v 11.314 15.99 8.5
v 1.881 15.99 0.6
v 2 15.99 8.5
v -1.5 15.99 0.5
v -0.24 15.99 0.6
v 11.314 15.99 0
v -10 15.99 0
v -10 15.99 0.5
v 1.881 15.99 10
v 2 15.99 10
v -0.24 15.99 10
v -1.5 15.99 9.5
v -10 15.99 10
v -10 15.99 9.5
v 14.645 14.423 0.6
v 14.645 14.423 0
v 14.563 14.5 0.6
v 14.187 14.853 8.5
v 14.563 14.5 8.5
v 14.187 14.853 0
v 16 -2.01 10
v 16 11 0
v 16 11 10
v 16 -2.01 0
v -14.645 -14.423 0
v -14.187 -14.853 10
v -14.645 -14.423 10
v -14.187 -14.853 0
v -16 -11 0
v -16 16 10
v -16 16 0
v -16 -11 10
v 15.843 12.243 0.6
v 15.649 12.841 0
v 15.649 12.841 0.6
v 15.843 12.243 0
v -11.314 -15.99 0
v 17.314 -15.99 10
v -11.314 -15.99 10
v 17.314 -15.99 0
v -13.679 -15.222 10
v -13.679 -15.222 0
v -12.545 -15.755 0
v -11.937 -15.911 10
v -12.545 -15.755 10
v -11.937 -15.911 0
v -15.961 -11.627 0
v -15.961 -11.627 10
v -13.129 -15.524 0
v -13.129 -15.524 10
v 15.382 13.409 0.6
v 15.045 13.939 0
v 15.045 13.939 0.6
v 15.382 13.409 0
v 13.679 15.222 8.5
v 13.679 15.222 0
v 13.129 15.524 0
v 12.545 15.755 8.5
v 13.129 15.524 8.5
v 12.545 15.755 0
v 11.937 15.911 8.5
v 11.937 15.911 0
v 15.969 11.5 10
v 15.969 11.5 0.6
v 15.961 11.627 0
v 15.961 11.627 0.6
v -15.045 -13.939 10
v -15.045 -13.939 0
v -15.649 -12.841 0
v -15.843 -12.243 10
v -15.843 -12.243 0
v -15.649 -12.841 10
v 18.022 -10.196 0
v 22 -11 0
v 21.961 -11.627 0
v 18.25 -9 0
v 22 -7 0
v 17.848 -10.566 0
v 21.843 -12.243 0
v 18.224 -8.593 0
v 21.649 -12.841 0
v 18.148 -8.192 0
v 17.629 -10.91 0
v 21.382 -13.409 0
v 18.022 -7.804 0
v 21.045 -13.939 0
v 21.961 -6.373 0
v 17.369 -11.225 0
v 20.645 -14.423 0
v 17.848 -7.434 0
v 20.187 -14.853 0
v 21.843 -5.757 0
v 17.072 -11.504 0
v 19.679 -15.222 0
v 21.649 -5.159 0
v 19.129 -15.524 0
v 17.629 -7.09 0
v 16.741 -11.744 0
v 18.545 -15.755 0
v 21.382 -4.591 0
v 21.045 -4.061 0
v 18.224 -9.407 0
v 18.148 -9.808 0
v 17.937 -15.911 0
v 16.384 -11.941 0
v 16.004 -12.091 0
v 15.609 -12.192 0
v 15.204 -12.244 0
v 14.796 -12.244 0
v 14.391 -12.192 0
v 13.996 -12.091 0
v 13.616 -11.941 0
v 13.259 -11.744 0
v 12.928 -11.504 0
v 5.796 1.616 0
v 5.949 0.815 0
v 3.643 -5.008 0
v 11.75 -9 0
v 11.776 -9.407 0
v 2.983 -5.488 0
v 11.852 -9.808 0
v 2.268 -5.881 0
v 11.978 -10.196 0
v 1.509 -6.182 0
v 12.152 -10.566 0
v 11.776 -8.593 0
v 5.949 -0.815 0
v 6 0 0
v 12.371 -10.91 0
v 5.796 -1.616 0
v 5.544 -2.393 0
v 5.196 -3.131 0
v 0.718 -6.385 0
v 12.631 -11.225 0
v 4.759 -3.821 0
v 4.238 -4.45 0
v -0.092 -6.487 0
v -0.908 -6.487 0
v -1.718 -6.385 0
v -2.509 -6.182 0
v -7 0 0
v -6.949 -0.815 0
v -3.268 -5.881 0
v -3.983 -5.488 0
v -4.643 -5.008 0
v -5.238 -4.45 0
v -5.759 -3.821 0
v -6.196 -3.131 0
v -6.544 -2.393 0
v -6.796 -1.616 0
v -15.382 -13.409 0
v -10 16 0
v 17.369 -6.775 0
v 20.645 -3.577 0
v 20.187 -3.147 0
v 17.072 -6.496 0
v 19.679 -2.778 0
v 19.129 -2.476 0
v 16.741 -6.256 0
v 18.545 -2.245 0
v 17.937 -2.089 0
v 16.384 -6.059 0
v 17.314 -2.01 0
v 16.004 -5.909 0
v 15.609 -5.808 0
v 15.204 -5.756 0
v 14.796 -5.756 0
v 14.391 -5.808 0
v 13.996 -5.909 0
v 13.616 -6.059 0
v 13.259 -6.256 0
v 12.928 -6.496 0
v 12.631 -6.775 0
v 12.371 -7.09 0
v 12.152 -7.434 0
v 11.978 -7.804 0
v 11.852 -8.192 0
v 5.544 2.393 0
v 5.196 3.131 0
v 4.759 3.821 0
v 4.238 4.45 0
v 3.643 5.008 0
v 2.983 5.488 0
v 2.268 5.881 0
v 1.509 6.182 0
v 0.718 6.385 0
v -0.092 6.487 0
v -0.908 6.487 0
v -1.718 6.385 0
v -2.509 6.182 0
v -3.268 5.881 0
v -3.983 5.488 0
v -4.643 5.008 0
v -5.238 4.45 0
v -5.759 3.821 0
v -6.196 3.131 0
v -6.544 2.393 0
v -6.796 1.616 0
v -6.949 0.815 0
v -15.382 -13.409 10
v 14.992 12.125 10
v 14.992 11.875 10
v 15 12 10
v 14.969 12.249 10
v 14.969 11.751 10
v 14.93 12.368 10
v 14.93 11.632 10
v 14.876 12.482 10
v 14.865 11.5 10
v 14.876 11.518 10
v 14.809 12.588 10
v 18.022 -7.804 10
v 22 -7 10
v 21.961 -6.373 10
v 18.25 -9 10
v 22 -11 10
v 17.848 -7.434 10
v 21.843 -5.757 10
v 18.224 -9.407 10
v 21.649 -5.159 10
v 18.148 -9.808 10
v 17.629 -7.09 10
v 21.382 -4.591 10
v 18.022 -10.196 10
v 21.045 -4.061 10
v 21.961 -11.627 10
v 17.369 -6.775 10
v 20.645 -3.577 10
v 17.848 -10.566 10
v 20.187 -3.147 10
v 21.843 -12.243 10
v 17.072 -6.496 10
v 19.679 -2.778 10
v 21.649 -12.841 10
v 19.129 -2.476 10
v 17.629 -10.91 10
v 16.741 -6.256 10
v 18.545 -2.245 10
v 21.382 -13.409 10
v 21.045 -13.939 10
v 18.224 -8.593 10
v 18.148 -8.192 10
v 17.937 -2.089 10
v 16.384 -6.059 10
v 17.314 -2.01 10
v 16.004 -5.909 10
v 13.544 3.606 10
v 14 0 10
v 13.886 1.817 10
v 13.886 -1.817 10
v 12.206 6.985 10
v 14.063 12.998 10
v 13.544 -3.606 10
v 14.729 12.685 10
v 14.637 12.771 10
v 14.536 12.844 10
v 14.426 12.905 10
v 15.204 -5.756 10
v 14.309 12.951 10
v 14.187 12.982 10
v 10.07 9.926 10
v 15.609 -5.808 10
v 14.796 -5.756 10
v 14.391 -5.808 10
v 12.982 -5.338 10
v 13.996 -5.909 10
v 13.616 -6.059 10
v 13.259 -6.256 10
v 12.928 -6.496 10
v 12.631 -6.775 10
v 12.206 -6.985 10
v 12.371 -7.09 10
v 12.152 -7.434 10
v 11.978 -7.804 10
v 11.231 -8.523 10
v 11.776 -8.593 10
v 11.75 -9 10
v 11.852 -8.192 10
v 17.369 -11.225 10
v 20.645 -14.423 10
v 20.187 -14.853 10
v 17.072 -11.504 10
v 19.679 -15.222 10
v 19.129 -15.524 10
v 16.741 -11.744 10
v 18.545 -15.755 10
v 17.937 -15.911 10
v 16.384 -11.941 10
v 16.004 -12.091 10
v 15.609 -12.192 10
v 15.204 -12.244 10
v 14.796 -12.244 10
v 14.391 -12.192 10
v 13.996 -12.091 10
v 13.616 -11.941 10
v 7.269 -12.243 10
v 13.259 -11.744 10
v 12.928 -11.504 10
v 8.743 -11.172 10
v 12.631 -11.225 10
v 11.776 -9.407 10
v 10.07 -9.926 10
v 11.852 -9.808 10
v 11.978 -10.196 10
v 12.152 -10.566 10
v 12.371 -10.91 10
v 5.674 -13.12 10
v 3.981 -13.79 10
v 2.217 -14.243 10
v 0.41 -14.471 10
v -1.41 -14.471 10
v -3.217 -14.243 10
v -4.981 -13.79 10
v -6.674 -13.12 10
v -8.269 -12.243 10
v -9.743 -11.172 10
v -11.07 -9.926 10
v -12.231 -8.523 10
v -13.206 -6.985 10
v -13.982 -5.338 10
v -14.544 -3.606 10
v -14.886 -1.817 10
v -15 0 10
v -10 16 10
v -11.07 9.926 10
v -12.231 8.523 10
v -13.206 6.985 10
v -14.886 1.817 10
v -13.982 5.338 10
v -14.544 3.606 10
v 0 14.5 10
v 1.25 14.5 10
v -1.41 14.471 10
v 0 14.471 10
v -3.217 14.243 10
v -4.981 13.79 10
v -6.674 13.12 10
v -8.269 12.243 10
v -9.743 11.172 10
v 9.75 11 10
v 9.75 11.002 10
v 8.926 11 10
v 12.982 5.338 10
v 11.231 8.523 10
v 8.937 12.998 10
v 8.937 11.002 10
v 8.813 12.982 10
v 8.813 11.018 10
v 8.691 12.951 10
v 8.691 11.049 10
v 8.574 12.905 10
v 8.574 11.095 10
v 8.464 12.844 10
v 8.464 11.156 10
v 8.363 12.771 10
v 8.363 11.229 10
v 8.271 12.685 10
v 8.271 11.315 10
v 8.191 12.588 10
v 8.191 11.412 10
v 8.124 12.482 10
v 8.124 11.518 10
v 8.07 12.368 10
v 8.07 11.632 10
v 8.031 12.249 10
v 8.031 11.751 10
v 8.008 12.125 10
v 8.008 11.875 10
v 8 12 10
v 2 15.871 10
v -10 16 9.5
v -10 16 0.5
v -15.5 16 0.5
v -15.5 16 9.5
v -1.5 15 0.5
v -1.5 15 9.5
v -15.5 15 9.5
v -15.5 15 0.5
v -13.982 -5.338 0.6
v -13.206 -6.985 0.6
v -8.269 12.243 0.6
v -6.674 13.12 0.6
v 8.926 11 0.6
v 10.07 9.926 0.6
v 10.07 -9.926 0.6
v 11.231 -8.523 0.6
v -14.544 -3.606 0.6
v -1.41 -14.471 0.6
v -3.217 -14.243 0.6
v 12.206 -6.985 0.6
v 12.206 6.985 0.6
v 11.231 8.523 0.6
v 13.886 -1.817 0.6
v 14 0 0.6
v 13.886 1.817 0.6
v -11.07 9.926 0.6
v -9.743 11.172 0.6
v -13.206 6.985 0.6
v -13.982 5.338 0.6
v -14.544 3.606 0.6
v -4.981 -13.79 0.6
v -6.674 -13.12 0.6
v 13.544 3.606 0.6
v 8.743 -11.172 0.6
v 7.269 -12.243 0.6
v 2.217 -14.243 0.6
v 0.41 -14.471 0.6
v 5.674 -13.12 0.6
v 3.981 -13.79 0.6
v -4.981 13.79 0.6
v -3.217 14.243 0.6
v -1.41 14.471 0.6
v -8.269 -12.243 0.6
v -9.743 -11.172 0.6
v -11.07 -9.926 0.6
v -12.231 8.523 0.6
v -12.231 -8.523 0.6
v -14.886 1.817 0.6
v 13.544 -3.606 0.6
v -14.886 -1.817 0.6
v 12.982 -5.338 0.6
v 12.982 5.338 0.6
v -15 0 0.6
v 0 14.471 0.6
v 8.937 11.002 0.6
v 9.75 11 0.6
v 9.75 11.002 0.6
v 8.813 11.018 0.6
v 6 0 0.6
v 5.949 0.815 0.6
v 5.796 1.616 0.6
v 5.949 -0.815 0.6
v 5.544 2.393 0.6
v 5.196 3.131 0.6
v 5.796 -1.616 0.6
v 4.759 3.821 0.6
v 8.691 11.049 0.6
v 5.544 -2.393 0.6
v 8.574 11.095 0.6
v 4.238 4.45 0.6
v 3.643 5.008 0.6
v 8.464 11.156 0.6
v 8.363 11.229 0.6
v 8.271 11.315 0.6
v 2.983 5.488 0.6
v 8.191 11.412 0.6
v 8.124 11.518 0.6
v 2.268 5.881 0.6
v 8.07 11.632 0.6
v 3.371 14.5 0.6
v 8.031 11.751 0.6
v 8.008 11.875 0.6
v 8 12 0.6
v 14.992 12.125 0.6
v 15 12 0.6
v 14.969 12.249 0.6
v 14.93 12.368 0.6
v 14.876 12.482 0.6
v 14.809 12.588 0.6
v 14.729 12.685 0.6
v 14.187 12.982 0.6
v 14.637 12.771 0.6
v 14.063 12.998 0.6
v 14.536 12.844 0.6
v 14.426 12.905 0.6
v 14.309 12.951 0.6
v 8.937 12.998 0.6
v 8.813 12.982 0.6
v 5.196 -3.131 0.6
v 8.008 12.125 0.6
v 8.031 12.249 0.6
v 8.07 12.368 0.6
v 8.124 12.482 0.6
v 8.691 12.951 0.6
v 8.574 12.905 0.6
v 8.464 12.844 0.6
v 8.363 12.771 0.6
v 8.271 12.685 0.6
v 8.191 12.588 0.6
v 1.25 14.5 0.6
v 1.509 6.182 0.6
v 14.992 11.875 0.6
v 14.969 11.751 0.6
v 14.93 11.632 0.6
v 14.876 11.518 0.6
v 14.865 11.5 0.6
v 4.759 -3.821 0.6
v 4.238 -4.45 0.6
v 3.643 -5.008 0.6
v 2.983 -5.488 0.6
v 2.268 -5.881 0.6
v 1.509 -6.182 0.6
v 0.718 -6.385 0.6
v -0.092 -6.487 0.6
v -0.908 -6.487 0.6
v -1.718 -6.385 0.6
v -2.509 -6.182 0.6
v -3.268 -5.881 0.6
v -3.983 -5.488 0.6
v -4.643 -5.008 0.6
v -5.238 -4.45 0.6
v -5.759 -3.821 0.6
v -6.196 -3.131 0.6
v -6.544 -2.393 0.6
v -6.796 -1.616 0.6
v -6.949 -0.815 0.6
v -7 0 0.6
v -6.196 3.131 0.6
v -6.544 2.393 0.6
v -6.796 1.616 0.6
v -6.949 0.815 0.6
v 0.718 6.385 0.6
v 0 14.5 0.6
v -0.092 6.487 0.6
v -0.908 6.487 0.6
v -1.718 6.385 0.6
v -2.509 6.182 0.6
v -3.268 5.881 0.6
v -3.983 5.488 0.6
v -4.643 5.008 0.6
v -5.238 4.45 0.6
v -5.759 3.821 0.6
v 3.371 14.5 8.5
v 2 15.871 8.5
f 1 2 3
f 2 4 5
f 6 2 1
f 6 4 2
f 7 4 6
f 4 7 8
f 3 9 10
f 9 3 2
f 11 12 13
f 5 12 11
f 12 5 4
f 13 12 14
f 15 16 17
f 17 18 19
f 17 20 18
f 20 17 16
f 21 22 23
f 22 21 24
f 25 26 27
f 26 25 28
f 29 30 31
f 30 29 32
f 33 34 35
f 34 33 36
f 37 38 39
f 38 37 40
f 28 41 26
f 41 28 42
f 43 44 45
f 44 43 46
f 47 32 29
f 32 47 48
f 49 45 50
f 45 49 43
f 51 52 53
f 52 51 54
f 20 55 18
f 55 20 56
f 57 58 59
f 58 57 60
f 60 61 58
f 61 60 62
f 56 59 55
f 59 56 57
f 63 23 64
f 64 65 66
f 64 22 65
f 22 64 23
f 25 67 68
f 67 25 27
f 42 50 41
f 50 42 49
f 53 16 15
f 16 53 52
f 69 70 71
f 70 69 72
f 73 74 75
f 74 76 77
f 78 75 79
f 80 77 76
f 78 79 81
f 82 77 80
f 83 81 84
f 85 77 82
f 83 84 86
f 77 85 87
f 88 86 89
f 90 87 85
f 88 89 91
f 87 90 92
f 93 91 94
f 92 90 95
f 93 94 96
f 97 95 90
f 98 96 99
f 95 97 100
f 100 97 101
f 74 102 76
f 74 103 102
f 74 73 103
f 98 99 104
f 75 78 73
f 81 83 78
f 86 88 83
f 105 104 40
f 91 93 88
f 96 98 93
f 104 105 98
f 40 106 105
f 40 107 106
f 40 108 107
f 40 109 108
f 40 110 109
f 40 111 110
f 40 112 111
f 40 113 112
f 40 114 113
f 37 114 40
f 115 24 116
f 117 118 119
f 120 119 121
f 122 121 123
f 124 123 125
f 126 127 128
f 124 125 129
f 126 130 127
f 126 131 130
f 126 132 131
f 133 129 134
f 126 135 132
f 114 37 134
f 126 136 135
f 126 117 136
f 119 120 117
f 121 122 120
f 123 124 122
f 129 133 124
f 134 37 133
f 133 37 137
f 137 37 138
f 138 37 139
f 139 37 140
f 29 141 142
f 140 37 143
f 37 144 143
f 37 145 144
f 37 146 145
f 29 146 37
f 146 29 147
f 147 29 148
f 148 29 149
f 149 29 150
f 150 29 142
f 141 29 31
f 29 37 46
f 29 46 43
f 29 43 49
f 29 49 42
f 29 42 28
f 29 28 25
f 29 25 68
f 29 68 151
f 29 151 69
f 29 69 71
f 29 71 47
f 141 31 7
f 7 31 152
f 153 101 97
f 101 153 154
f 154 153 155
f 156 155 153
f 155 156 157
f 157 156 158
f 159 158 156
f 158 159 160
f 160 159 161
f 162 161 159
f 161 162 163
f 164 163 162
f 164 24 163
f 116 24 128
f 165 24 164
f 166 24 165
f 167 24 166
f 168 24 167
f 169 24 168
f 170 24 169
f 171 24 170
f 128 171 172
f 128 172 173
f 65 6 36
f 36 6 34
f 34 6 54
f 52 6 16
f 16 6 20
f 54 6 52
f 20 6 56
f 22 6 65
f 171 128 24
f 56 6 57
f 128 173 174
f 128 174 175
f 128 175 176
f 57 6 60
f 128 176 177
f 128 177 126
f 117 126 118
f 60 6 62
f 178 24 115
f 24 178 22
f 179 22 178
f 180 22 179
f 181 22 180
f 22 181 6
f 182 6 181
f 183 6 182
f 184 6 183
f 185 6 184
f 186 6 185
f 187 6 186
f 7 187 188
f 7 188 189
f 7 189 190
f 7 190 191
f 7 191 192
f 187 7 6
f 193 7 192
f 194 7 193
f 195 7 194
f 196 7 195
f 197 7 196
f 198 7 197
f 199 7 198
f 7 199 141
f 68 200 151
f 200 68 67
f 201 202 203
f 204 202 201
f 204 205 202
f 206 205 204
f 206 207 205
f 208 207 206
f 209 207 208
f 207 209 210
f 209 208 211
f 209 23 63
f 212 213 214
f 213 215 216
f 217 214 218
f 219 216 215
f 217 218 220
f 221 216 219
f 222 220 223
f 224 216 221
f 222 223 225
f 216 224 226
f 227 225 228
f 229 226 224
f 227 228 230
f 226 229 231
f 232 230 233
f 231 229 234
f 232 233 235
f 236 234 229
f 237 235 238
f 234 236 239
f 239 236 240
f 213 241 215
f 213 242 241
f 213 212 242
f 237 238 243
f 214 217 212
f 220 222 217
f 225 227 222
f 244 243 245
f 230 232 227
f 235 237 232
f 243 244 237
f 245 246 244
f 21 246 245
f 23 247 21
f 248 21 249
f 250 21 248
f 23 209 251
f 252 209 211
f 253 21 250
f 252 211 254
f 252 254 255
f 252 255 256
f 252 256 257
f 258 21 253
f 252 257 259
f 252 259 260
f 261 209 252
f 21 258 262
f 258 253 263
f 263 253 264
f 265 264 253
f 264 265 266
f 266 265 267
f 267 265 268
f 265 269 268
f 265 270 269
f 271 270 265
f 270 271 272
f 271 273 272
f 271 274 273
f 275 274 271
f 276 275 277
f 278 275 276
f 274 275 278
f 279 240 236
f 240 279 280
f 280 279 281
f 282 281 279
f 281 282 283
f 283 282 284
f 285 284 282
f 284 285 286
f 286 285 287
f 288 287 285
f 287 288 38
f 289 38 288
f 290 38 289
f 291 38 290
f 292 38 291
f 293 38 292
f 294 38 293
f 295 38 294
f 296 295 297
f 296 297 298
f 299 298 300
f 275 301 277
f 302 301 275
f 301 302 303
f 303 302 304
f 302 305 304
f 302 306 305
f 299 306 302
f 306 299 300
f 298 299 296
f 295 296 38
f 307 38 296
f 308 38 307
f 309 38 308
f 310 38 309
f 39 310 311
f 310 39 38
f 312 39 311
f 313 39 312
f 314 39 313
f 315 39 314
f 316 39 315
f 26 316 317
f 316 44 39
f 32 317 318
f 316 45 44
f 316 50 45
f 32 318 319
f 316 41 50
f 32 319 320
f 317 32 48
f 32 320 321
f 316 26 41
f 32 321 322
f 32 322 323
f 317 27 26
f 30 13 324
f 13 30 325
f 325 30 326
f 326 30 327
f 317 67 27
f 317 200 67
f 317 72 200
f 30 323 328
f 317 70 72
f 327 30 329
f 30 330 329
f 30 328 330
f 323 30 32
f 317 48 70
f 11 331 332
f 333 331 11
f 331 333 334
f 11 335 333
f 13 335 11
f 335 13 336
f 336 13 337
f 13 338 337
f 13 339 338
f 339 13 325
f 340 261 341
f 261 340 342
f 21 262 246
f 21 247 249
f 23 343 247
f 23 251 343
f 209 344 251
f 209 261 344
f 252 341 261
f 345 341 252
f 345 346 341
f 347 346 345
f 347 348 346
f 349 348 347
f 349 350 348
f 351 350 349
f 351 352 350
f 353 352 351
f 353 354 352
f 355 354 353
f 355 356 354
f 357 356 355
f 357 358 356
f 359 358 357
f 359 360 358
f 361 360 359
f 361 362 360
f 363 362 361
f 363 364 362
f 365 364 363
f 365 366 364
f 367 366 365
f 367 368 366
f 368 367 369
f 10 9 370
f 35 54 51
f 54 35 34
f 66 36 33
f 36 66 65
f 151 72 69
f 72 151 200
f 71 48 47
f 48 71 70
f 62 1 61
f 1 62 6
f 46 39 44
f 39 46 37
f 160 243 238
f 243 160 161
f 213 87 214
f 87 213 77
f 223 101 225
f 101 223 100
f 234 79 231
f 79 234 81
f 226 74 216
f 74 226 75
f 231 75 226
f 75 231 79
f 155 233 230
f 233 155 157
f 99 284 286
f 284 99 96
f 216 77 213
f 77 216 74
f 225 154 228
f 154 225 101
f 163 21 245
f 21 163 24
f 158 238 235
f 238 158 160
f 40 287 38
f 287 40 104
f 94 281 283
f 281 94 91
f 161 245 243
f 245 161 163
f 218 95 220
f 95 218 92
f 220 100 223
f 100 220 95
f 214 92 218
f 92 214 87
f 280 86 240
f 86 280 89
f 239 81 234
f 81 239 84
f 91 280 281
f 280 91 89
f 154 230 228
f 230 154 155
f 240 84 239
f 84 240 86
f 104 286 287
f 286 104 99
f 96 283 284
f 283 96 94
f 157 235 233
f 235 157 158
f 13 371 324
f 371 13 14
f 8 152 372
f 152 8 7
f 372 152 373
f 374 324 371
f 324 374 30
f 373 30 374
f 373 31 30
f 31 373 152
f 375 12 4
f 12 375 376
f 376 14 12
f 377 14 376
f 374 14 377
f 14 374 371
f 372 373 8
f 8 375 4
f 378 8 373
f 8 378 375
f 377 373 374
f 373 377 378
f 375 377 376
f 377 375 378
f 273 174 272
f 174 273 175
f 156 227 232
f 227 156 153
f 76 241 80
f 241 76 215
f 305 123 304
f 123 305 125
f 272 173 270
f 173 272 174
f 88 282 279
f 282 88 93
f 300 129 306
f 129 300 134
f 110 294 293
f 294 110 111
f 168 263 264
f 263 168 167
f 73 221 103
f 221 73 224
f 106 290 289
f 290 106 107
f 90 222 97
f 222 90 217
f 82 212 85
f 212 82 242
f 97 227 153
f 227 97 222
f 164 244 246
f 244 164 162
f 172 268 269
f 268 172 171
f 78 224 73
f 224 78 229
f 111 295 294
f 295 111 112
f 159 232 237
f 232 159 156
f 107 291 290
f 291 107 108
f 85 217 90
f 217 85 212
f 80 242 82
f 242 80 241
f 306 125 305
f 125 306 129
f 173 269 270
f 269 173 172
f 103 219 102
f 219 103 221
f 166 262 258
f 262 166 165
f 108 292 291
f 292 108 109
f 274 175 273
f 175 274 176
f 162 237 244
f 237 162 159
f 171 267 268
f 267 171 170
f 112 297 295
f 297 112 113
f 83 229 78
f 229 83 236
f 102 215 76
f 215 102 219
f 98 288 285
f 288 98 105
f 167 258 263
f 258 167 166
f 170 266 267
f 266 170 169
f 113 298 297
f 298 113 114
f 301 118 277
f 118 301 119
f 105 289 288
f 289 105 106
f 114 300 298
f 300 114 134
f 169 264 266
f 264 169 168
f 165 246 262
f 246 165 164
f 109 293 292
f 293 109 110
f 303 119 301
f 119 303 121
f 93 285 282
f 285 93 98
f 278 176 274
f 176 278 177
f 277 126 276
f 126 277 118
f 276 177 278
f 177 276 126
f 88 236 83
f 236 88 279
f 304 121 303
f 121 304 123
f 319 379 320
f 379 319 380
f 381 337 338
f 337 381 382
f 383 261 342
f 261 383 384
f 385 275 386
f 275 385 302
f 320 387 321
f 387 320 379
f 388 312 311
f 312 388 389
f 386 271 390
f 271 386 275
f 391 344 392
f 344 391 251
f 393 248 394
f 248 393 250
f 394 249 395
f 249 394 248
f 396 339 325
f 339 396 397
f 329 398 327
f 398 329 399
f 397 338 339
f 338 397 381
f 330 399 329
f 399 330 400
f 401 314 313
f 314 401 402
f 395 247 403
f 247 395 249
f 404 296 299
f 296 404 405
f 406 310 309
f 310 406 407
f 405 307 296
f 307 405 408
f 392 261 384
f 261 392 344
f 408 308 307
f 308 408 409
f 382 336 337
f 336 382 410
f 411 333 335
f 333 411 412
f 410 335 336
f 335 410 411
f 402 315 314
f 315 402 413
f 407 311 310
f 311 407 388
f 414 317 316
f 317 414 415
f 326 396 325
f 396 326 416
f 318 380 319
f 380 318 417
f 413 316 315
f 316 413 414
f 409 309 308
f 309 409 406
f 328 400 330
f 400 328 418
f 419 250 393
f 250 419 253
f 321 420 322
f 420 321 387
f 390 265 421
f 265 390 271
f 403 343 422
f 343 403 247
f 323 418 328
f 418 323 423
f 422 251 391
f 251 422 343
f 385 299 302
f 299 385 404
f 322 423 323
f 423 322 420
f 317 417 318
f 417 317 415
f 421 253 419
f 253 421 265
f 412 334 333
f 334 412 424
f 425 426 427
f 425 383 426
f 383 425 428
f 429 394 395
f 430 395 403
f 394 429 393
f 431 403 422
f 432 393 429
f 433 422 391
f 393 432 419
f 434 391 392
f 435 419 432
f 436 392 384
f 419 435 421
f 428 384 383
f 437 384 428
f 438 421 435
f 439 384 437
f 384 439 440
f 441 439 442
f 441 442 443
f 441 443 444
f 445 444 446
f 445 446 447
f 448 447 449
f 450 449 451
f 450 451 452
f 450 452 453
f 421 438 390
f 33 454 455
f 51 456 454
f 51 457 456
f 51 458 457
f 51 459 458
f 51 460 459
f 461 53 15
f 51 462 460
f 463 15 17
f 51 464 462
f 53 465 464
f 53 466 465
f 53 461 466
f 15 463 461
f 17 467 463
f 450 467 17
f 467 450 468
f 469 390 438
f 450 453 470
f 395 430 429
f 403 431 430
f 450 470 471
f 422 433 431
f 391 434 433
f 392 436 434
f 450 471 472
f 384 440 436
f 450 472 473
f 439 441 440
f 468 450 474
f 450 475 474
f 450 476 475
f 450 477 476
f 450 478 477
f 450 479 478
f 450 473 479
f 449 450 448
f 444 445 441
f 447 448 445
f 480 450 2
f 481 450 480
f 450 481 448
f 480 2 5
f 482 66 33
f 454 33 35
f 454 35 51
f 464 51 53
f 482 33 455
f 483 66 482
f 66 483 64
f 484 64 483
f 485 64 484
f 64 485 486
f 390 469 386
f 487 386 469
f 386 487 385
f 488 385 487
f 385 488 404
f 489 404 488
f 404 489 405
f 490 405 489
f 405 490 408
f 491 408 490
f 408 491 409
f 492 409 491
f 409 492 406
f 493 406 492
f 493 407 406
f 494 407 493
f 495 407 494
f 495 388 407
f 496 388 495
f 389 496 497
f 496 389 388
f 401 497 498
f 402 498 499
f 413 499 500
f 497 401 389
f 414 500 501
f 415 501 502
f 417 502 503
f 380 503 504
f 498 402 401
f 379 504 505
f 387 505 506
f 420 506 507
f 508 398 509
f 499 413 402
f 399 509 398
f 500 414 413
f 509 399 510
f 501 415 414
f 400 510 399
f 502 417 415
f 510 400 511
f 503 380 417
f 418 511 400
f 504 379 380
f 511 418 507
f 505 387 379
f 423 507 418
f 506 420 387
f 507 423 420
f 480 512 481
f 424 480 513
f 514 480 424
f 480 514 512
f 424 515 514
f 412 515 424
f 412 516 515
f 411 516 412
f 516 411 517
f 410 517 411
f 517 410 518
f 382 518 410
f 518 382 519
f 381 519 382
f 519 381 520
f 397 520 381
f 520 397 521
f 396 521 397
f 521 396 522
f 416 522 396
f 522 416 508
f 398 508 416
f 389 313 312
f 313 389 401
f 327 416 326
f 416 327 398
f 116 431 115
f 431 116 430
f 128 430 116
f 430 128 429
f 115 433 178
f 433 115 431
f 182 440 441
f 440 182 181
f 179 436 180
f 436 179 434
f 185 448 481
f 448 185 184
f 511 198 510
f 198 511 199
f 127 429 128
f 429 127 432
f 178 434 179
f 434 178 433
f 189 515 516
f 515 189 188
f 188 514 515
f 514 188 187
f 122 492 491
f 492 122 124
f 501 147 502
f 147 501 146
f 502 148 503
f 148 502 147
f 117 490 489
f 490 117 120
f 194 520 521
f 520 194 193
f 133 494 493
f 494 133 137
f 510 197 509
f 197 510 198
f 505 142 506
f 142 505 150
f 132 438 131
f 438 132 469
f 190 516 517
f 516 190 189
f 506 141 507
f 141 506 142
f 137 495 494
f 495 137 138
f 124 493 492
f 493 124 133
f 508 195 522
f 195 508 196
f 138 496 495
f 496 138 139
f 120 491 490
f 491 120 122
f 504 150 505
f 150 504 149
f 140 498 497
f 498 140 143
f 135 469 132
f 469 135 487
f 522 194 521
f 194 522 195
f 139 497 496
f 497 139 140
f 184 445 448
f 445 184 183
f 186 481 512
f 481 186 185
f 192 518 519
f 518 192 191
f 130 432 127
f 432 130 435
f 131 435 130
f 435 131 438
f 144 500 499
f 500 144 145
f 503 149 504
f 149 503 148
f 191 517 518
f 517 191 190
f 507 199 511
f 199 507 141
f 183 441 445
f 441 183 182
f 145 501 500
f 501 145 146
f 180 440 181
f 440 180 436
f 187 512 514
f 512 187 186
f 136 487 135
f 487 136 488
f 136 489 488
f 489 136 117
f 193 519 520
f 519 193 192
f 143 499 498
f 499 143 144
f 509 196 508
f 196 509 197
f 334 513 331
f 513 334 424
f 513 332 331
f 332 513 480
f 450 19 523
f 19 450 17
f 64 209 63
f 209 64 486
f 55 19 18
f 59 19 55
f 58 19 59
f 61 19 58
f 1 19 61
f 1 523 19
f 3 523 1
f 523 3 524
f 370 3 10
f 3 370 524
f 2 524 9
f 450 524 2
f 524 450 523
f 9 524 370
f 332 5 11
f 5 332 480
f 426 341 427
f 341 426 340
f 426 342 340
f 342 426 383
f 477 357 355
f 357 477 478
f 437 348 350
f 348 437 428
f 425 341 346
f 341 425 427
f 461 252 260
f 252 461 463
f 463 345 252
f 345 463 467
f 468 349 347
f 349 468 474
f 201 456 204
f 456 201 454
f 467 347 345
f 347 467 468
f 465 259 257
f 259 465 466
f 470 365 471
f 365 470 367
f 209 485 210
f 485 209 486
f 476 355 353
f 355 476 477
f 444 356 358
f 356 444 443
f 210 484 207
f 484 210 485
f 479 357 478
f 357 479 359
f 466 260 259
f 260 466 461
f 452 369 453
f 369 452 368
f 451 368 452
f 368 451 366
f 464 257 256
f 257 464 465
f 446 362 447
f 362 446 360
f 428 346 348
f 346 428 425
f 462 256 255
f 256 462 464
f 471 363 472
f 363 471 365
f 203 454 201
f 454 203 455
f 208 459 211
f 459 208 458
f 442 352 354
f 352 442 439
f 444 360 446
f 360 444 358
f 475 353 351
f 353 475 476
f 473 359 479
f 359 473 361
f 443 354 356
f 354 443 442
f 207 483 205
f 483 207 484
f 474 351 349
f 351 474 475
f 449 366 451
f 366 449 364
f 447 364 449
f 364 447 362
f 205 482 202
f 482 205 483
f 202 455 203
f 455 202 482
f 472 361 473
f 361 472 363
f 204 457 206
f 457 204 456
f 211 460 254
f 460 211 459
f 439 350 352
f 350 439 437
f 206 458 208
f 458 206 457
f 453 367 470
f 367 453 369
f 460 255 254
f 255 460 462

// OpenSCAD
$fn = 50;


union() {
	difference() {
		union() {
			translate(v = [0, 0, 0]) {
				rotate(a = [0, 0, 0]) {
					hull() {
						translate(v = [-11.0000000000, 11.0000000000, 0]) {
							rotate(a = [0, 0, 0]) {
								translate(v = [0, 0, 0]) {
									rotate(a = [0, 0, 0]) {
										cylinder(h = 10, r = 5);
									}
								}
							}
						}
						translate(v = [11.0000000000, 11.0000000000, 0]) {
							rotate(a = [0, 0, 0]) {
								translate(v = [0, 0, 0]) {
									rotate(a = [0, 0, 0]) {
										cylinder(h = 10, r = 5);
									}
								}
							}
						}
						translate(v = [-11.0000000000, -11.0000000000, 0]) {
							rotate(a = [0, 0, 0]) {
								translate(v = [0, 0, 0]) {
									rotate(a = [0, 0, 0]) {
										cylinder(h = 10, r = 5);
									}
								}
							}
						}
						translate(v = [11.0000000000, -11.0000000000, 0]) {
							rotate(a = [0, 0, 0]) {
								translate(v = [0, 0, 0]) {
									rotate(a = [0, 0, 0]) {
										cylinder(h = 10, r = 5);
									}
								}
							}
						}
					}
				}
			}
			translate(v = [7.5000000000, -9.0000000000, 0]) {
				rotate(a = [0, 0, 0]) {
					hull() {
						translate(v = [-9.5000000000, 2.0000000000, 0]) {
							rotate(a = [0, 0, 0]) {
								translate(v = [0, 0, 0]) {
									rotate(a = [0, 0, 0]) {
										cylinder(h = 10, r = 5);
									}
								}
							}
						}
						translate(v = [9.5000000000, 2.0000000000, 0]) {
							rotate(a = [0, 0, 0]) {
								translate(v = [0, 0, 0]) {
									rotate(a = [0, 0, 0]) {
										cylinder(h = 10, r = 5);
									}
								}
							}
						}
						translate(v = [-9.5000000000, -2.0000000000, 0]) {
							rotate(a = [0, 0, 0]) {
								translate(v = [0, 0, 0]) {
									rotate(a = [0, 0, 0]) {
										cylinder(h = 10, r = 5);
									}
								}
							}
						}
						translate(v = [9.5000000000, -2.0000000000, 0]) {
							rotate(a = [0, 0, 0]) {
								translate(v = [0, 0, 0]) {
									rotate(a = [0, 0, 0]) {
										cylinder(h = 10, r = 5);
									}
								}
							}
						}
					}
				}
			}
			translate(v = [-16.0000000000, 10.0000000000, 0]) {
				rotate(a = [0, 0, 0]) {
					cube(size = [6, 6, 10]);
				}
			}
		}
		union() {
			translate(v = [-15.5000000000, 15.0000000000, 0.5000000000]) {
				rotate(a = [0, 0, 0]) {
					cube(size = [14, 1, 9.0000000000]);
				}
			}
			translate(v = [15.0000000000, -9.0000000000, -125.0000000000]) {
				rotate(a = [0, 0, 0]) {
					cylinder(h = 250, r = 3.2500000000);
				}
			}
			translate(v = [-0.5000000000, 0.0000000000, 0.6000000000]) {
				rotate(a = [0, 0, 0]) {
					cylinder(h = 12.4000000000, r = 14.5000000000);
				}
			}
			translate(v = [-0.5000000000, 0.0000000000, -5.0000000000]) {
				rotate(a = [0, 0, 0]) {
					cylinder(h = 10, r = 6.5000000000);
				}
			}
			translate(v = [0.0000000000, 11.5000000000, 0.6000000000]) {
				rotate(a = [0, 0, 0]) {
					cube(size = [16.0000000000, 3, 12.4000000000]);
				}
			}
			translate(v = [2.0000000000, 11.5000000000, 8.5000000000]) {
				rotate(a = [0, 0, 0]) {
					cube(size = [14.0000000000, 6, 1.5000000000]);
				}
			}
			translate(v = [-3.0000000000, 18.7500000000, 0.6000000000]) {
				rotate(a = [0, 0, -45]) {
					cube(size = [10, 1.5000000000, 12.4000000000]);
				}
			}
			translate(v = [2.2500000000, 11.0000000000, 0.6000000000]) {
				rotate(a = [0, 0, 0]) {
					cube(size = [7.5000000000, 2, 9.4000000000]);
				}
			}
		}
	}
	union() {
		translate(v = [11.5000000000, 12, 0]) {
			rotate(a = [0, 0, 0]) {
				hull() {
					translate(v = [2.5000000000, 0, 0]) {
						rotate(a = [0, 0, 0]) {
							translate(v = [0, 0, 0]) {
								rotate(a = [0, 0, 0]) {
									cylinder(h = 10, r = 1.0000000000);
								}
							}
						}
					}
					translate(v = [-2.5000000000, 0, 0]) {
						rotate(a = [0, 0, 0]) {
							translate(v = [0, 0, 0]) {
								rotate(a = [0, 0, 0]) {
									cylinder(h = 10, r = 1.0000000000);
								}
							}
						}
					}
				}
			}
		}
	}
}
